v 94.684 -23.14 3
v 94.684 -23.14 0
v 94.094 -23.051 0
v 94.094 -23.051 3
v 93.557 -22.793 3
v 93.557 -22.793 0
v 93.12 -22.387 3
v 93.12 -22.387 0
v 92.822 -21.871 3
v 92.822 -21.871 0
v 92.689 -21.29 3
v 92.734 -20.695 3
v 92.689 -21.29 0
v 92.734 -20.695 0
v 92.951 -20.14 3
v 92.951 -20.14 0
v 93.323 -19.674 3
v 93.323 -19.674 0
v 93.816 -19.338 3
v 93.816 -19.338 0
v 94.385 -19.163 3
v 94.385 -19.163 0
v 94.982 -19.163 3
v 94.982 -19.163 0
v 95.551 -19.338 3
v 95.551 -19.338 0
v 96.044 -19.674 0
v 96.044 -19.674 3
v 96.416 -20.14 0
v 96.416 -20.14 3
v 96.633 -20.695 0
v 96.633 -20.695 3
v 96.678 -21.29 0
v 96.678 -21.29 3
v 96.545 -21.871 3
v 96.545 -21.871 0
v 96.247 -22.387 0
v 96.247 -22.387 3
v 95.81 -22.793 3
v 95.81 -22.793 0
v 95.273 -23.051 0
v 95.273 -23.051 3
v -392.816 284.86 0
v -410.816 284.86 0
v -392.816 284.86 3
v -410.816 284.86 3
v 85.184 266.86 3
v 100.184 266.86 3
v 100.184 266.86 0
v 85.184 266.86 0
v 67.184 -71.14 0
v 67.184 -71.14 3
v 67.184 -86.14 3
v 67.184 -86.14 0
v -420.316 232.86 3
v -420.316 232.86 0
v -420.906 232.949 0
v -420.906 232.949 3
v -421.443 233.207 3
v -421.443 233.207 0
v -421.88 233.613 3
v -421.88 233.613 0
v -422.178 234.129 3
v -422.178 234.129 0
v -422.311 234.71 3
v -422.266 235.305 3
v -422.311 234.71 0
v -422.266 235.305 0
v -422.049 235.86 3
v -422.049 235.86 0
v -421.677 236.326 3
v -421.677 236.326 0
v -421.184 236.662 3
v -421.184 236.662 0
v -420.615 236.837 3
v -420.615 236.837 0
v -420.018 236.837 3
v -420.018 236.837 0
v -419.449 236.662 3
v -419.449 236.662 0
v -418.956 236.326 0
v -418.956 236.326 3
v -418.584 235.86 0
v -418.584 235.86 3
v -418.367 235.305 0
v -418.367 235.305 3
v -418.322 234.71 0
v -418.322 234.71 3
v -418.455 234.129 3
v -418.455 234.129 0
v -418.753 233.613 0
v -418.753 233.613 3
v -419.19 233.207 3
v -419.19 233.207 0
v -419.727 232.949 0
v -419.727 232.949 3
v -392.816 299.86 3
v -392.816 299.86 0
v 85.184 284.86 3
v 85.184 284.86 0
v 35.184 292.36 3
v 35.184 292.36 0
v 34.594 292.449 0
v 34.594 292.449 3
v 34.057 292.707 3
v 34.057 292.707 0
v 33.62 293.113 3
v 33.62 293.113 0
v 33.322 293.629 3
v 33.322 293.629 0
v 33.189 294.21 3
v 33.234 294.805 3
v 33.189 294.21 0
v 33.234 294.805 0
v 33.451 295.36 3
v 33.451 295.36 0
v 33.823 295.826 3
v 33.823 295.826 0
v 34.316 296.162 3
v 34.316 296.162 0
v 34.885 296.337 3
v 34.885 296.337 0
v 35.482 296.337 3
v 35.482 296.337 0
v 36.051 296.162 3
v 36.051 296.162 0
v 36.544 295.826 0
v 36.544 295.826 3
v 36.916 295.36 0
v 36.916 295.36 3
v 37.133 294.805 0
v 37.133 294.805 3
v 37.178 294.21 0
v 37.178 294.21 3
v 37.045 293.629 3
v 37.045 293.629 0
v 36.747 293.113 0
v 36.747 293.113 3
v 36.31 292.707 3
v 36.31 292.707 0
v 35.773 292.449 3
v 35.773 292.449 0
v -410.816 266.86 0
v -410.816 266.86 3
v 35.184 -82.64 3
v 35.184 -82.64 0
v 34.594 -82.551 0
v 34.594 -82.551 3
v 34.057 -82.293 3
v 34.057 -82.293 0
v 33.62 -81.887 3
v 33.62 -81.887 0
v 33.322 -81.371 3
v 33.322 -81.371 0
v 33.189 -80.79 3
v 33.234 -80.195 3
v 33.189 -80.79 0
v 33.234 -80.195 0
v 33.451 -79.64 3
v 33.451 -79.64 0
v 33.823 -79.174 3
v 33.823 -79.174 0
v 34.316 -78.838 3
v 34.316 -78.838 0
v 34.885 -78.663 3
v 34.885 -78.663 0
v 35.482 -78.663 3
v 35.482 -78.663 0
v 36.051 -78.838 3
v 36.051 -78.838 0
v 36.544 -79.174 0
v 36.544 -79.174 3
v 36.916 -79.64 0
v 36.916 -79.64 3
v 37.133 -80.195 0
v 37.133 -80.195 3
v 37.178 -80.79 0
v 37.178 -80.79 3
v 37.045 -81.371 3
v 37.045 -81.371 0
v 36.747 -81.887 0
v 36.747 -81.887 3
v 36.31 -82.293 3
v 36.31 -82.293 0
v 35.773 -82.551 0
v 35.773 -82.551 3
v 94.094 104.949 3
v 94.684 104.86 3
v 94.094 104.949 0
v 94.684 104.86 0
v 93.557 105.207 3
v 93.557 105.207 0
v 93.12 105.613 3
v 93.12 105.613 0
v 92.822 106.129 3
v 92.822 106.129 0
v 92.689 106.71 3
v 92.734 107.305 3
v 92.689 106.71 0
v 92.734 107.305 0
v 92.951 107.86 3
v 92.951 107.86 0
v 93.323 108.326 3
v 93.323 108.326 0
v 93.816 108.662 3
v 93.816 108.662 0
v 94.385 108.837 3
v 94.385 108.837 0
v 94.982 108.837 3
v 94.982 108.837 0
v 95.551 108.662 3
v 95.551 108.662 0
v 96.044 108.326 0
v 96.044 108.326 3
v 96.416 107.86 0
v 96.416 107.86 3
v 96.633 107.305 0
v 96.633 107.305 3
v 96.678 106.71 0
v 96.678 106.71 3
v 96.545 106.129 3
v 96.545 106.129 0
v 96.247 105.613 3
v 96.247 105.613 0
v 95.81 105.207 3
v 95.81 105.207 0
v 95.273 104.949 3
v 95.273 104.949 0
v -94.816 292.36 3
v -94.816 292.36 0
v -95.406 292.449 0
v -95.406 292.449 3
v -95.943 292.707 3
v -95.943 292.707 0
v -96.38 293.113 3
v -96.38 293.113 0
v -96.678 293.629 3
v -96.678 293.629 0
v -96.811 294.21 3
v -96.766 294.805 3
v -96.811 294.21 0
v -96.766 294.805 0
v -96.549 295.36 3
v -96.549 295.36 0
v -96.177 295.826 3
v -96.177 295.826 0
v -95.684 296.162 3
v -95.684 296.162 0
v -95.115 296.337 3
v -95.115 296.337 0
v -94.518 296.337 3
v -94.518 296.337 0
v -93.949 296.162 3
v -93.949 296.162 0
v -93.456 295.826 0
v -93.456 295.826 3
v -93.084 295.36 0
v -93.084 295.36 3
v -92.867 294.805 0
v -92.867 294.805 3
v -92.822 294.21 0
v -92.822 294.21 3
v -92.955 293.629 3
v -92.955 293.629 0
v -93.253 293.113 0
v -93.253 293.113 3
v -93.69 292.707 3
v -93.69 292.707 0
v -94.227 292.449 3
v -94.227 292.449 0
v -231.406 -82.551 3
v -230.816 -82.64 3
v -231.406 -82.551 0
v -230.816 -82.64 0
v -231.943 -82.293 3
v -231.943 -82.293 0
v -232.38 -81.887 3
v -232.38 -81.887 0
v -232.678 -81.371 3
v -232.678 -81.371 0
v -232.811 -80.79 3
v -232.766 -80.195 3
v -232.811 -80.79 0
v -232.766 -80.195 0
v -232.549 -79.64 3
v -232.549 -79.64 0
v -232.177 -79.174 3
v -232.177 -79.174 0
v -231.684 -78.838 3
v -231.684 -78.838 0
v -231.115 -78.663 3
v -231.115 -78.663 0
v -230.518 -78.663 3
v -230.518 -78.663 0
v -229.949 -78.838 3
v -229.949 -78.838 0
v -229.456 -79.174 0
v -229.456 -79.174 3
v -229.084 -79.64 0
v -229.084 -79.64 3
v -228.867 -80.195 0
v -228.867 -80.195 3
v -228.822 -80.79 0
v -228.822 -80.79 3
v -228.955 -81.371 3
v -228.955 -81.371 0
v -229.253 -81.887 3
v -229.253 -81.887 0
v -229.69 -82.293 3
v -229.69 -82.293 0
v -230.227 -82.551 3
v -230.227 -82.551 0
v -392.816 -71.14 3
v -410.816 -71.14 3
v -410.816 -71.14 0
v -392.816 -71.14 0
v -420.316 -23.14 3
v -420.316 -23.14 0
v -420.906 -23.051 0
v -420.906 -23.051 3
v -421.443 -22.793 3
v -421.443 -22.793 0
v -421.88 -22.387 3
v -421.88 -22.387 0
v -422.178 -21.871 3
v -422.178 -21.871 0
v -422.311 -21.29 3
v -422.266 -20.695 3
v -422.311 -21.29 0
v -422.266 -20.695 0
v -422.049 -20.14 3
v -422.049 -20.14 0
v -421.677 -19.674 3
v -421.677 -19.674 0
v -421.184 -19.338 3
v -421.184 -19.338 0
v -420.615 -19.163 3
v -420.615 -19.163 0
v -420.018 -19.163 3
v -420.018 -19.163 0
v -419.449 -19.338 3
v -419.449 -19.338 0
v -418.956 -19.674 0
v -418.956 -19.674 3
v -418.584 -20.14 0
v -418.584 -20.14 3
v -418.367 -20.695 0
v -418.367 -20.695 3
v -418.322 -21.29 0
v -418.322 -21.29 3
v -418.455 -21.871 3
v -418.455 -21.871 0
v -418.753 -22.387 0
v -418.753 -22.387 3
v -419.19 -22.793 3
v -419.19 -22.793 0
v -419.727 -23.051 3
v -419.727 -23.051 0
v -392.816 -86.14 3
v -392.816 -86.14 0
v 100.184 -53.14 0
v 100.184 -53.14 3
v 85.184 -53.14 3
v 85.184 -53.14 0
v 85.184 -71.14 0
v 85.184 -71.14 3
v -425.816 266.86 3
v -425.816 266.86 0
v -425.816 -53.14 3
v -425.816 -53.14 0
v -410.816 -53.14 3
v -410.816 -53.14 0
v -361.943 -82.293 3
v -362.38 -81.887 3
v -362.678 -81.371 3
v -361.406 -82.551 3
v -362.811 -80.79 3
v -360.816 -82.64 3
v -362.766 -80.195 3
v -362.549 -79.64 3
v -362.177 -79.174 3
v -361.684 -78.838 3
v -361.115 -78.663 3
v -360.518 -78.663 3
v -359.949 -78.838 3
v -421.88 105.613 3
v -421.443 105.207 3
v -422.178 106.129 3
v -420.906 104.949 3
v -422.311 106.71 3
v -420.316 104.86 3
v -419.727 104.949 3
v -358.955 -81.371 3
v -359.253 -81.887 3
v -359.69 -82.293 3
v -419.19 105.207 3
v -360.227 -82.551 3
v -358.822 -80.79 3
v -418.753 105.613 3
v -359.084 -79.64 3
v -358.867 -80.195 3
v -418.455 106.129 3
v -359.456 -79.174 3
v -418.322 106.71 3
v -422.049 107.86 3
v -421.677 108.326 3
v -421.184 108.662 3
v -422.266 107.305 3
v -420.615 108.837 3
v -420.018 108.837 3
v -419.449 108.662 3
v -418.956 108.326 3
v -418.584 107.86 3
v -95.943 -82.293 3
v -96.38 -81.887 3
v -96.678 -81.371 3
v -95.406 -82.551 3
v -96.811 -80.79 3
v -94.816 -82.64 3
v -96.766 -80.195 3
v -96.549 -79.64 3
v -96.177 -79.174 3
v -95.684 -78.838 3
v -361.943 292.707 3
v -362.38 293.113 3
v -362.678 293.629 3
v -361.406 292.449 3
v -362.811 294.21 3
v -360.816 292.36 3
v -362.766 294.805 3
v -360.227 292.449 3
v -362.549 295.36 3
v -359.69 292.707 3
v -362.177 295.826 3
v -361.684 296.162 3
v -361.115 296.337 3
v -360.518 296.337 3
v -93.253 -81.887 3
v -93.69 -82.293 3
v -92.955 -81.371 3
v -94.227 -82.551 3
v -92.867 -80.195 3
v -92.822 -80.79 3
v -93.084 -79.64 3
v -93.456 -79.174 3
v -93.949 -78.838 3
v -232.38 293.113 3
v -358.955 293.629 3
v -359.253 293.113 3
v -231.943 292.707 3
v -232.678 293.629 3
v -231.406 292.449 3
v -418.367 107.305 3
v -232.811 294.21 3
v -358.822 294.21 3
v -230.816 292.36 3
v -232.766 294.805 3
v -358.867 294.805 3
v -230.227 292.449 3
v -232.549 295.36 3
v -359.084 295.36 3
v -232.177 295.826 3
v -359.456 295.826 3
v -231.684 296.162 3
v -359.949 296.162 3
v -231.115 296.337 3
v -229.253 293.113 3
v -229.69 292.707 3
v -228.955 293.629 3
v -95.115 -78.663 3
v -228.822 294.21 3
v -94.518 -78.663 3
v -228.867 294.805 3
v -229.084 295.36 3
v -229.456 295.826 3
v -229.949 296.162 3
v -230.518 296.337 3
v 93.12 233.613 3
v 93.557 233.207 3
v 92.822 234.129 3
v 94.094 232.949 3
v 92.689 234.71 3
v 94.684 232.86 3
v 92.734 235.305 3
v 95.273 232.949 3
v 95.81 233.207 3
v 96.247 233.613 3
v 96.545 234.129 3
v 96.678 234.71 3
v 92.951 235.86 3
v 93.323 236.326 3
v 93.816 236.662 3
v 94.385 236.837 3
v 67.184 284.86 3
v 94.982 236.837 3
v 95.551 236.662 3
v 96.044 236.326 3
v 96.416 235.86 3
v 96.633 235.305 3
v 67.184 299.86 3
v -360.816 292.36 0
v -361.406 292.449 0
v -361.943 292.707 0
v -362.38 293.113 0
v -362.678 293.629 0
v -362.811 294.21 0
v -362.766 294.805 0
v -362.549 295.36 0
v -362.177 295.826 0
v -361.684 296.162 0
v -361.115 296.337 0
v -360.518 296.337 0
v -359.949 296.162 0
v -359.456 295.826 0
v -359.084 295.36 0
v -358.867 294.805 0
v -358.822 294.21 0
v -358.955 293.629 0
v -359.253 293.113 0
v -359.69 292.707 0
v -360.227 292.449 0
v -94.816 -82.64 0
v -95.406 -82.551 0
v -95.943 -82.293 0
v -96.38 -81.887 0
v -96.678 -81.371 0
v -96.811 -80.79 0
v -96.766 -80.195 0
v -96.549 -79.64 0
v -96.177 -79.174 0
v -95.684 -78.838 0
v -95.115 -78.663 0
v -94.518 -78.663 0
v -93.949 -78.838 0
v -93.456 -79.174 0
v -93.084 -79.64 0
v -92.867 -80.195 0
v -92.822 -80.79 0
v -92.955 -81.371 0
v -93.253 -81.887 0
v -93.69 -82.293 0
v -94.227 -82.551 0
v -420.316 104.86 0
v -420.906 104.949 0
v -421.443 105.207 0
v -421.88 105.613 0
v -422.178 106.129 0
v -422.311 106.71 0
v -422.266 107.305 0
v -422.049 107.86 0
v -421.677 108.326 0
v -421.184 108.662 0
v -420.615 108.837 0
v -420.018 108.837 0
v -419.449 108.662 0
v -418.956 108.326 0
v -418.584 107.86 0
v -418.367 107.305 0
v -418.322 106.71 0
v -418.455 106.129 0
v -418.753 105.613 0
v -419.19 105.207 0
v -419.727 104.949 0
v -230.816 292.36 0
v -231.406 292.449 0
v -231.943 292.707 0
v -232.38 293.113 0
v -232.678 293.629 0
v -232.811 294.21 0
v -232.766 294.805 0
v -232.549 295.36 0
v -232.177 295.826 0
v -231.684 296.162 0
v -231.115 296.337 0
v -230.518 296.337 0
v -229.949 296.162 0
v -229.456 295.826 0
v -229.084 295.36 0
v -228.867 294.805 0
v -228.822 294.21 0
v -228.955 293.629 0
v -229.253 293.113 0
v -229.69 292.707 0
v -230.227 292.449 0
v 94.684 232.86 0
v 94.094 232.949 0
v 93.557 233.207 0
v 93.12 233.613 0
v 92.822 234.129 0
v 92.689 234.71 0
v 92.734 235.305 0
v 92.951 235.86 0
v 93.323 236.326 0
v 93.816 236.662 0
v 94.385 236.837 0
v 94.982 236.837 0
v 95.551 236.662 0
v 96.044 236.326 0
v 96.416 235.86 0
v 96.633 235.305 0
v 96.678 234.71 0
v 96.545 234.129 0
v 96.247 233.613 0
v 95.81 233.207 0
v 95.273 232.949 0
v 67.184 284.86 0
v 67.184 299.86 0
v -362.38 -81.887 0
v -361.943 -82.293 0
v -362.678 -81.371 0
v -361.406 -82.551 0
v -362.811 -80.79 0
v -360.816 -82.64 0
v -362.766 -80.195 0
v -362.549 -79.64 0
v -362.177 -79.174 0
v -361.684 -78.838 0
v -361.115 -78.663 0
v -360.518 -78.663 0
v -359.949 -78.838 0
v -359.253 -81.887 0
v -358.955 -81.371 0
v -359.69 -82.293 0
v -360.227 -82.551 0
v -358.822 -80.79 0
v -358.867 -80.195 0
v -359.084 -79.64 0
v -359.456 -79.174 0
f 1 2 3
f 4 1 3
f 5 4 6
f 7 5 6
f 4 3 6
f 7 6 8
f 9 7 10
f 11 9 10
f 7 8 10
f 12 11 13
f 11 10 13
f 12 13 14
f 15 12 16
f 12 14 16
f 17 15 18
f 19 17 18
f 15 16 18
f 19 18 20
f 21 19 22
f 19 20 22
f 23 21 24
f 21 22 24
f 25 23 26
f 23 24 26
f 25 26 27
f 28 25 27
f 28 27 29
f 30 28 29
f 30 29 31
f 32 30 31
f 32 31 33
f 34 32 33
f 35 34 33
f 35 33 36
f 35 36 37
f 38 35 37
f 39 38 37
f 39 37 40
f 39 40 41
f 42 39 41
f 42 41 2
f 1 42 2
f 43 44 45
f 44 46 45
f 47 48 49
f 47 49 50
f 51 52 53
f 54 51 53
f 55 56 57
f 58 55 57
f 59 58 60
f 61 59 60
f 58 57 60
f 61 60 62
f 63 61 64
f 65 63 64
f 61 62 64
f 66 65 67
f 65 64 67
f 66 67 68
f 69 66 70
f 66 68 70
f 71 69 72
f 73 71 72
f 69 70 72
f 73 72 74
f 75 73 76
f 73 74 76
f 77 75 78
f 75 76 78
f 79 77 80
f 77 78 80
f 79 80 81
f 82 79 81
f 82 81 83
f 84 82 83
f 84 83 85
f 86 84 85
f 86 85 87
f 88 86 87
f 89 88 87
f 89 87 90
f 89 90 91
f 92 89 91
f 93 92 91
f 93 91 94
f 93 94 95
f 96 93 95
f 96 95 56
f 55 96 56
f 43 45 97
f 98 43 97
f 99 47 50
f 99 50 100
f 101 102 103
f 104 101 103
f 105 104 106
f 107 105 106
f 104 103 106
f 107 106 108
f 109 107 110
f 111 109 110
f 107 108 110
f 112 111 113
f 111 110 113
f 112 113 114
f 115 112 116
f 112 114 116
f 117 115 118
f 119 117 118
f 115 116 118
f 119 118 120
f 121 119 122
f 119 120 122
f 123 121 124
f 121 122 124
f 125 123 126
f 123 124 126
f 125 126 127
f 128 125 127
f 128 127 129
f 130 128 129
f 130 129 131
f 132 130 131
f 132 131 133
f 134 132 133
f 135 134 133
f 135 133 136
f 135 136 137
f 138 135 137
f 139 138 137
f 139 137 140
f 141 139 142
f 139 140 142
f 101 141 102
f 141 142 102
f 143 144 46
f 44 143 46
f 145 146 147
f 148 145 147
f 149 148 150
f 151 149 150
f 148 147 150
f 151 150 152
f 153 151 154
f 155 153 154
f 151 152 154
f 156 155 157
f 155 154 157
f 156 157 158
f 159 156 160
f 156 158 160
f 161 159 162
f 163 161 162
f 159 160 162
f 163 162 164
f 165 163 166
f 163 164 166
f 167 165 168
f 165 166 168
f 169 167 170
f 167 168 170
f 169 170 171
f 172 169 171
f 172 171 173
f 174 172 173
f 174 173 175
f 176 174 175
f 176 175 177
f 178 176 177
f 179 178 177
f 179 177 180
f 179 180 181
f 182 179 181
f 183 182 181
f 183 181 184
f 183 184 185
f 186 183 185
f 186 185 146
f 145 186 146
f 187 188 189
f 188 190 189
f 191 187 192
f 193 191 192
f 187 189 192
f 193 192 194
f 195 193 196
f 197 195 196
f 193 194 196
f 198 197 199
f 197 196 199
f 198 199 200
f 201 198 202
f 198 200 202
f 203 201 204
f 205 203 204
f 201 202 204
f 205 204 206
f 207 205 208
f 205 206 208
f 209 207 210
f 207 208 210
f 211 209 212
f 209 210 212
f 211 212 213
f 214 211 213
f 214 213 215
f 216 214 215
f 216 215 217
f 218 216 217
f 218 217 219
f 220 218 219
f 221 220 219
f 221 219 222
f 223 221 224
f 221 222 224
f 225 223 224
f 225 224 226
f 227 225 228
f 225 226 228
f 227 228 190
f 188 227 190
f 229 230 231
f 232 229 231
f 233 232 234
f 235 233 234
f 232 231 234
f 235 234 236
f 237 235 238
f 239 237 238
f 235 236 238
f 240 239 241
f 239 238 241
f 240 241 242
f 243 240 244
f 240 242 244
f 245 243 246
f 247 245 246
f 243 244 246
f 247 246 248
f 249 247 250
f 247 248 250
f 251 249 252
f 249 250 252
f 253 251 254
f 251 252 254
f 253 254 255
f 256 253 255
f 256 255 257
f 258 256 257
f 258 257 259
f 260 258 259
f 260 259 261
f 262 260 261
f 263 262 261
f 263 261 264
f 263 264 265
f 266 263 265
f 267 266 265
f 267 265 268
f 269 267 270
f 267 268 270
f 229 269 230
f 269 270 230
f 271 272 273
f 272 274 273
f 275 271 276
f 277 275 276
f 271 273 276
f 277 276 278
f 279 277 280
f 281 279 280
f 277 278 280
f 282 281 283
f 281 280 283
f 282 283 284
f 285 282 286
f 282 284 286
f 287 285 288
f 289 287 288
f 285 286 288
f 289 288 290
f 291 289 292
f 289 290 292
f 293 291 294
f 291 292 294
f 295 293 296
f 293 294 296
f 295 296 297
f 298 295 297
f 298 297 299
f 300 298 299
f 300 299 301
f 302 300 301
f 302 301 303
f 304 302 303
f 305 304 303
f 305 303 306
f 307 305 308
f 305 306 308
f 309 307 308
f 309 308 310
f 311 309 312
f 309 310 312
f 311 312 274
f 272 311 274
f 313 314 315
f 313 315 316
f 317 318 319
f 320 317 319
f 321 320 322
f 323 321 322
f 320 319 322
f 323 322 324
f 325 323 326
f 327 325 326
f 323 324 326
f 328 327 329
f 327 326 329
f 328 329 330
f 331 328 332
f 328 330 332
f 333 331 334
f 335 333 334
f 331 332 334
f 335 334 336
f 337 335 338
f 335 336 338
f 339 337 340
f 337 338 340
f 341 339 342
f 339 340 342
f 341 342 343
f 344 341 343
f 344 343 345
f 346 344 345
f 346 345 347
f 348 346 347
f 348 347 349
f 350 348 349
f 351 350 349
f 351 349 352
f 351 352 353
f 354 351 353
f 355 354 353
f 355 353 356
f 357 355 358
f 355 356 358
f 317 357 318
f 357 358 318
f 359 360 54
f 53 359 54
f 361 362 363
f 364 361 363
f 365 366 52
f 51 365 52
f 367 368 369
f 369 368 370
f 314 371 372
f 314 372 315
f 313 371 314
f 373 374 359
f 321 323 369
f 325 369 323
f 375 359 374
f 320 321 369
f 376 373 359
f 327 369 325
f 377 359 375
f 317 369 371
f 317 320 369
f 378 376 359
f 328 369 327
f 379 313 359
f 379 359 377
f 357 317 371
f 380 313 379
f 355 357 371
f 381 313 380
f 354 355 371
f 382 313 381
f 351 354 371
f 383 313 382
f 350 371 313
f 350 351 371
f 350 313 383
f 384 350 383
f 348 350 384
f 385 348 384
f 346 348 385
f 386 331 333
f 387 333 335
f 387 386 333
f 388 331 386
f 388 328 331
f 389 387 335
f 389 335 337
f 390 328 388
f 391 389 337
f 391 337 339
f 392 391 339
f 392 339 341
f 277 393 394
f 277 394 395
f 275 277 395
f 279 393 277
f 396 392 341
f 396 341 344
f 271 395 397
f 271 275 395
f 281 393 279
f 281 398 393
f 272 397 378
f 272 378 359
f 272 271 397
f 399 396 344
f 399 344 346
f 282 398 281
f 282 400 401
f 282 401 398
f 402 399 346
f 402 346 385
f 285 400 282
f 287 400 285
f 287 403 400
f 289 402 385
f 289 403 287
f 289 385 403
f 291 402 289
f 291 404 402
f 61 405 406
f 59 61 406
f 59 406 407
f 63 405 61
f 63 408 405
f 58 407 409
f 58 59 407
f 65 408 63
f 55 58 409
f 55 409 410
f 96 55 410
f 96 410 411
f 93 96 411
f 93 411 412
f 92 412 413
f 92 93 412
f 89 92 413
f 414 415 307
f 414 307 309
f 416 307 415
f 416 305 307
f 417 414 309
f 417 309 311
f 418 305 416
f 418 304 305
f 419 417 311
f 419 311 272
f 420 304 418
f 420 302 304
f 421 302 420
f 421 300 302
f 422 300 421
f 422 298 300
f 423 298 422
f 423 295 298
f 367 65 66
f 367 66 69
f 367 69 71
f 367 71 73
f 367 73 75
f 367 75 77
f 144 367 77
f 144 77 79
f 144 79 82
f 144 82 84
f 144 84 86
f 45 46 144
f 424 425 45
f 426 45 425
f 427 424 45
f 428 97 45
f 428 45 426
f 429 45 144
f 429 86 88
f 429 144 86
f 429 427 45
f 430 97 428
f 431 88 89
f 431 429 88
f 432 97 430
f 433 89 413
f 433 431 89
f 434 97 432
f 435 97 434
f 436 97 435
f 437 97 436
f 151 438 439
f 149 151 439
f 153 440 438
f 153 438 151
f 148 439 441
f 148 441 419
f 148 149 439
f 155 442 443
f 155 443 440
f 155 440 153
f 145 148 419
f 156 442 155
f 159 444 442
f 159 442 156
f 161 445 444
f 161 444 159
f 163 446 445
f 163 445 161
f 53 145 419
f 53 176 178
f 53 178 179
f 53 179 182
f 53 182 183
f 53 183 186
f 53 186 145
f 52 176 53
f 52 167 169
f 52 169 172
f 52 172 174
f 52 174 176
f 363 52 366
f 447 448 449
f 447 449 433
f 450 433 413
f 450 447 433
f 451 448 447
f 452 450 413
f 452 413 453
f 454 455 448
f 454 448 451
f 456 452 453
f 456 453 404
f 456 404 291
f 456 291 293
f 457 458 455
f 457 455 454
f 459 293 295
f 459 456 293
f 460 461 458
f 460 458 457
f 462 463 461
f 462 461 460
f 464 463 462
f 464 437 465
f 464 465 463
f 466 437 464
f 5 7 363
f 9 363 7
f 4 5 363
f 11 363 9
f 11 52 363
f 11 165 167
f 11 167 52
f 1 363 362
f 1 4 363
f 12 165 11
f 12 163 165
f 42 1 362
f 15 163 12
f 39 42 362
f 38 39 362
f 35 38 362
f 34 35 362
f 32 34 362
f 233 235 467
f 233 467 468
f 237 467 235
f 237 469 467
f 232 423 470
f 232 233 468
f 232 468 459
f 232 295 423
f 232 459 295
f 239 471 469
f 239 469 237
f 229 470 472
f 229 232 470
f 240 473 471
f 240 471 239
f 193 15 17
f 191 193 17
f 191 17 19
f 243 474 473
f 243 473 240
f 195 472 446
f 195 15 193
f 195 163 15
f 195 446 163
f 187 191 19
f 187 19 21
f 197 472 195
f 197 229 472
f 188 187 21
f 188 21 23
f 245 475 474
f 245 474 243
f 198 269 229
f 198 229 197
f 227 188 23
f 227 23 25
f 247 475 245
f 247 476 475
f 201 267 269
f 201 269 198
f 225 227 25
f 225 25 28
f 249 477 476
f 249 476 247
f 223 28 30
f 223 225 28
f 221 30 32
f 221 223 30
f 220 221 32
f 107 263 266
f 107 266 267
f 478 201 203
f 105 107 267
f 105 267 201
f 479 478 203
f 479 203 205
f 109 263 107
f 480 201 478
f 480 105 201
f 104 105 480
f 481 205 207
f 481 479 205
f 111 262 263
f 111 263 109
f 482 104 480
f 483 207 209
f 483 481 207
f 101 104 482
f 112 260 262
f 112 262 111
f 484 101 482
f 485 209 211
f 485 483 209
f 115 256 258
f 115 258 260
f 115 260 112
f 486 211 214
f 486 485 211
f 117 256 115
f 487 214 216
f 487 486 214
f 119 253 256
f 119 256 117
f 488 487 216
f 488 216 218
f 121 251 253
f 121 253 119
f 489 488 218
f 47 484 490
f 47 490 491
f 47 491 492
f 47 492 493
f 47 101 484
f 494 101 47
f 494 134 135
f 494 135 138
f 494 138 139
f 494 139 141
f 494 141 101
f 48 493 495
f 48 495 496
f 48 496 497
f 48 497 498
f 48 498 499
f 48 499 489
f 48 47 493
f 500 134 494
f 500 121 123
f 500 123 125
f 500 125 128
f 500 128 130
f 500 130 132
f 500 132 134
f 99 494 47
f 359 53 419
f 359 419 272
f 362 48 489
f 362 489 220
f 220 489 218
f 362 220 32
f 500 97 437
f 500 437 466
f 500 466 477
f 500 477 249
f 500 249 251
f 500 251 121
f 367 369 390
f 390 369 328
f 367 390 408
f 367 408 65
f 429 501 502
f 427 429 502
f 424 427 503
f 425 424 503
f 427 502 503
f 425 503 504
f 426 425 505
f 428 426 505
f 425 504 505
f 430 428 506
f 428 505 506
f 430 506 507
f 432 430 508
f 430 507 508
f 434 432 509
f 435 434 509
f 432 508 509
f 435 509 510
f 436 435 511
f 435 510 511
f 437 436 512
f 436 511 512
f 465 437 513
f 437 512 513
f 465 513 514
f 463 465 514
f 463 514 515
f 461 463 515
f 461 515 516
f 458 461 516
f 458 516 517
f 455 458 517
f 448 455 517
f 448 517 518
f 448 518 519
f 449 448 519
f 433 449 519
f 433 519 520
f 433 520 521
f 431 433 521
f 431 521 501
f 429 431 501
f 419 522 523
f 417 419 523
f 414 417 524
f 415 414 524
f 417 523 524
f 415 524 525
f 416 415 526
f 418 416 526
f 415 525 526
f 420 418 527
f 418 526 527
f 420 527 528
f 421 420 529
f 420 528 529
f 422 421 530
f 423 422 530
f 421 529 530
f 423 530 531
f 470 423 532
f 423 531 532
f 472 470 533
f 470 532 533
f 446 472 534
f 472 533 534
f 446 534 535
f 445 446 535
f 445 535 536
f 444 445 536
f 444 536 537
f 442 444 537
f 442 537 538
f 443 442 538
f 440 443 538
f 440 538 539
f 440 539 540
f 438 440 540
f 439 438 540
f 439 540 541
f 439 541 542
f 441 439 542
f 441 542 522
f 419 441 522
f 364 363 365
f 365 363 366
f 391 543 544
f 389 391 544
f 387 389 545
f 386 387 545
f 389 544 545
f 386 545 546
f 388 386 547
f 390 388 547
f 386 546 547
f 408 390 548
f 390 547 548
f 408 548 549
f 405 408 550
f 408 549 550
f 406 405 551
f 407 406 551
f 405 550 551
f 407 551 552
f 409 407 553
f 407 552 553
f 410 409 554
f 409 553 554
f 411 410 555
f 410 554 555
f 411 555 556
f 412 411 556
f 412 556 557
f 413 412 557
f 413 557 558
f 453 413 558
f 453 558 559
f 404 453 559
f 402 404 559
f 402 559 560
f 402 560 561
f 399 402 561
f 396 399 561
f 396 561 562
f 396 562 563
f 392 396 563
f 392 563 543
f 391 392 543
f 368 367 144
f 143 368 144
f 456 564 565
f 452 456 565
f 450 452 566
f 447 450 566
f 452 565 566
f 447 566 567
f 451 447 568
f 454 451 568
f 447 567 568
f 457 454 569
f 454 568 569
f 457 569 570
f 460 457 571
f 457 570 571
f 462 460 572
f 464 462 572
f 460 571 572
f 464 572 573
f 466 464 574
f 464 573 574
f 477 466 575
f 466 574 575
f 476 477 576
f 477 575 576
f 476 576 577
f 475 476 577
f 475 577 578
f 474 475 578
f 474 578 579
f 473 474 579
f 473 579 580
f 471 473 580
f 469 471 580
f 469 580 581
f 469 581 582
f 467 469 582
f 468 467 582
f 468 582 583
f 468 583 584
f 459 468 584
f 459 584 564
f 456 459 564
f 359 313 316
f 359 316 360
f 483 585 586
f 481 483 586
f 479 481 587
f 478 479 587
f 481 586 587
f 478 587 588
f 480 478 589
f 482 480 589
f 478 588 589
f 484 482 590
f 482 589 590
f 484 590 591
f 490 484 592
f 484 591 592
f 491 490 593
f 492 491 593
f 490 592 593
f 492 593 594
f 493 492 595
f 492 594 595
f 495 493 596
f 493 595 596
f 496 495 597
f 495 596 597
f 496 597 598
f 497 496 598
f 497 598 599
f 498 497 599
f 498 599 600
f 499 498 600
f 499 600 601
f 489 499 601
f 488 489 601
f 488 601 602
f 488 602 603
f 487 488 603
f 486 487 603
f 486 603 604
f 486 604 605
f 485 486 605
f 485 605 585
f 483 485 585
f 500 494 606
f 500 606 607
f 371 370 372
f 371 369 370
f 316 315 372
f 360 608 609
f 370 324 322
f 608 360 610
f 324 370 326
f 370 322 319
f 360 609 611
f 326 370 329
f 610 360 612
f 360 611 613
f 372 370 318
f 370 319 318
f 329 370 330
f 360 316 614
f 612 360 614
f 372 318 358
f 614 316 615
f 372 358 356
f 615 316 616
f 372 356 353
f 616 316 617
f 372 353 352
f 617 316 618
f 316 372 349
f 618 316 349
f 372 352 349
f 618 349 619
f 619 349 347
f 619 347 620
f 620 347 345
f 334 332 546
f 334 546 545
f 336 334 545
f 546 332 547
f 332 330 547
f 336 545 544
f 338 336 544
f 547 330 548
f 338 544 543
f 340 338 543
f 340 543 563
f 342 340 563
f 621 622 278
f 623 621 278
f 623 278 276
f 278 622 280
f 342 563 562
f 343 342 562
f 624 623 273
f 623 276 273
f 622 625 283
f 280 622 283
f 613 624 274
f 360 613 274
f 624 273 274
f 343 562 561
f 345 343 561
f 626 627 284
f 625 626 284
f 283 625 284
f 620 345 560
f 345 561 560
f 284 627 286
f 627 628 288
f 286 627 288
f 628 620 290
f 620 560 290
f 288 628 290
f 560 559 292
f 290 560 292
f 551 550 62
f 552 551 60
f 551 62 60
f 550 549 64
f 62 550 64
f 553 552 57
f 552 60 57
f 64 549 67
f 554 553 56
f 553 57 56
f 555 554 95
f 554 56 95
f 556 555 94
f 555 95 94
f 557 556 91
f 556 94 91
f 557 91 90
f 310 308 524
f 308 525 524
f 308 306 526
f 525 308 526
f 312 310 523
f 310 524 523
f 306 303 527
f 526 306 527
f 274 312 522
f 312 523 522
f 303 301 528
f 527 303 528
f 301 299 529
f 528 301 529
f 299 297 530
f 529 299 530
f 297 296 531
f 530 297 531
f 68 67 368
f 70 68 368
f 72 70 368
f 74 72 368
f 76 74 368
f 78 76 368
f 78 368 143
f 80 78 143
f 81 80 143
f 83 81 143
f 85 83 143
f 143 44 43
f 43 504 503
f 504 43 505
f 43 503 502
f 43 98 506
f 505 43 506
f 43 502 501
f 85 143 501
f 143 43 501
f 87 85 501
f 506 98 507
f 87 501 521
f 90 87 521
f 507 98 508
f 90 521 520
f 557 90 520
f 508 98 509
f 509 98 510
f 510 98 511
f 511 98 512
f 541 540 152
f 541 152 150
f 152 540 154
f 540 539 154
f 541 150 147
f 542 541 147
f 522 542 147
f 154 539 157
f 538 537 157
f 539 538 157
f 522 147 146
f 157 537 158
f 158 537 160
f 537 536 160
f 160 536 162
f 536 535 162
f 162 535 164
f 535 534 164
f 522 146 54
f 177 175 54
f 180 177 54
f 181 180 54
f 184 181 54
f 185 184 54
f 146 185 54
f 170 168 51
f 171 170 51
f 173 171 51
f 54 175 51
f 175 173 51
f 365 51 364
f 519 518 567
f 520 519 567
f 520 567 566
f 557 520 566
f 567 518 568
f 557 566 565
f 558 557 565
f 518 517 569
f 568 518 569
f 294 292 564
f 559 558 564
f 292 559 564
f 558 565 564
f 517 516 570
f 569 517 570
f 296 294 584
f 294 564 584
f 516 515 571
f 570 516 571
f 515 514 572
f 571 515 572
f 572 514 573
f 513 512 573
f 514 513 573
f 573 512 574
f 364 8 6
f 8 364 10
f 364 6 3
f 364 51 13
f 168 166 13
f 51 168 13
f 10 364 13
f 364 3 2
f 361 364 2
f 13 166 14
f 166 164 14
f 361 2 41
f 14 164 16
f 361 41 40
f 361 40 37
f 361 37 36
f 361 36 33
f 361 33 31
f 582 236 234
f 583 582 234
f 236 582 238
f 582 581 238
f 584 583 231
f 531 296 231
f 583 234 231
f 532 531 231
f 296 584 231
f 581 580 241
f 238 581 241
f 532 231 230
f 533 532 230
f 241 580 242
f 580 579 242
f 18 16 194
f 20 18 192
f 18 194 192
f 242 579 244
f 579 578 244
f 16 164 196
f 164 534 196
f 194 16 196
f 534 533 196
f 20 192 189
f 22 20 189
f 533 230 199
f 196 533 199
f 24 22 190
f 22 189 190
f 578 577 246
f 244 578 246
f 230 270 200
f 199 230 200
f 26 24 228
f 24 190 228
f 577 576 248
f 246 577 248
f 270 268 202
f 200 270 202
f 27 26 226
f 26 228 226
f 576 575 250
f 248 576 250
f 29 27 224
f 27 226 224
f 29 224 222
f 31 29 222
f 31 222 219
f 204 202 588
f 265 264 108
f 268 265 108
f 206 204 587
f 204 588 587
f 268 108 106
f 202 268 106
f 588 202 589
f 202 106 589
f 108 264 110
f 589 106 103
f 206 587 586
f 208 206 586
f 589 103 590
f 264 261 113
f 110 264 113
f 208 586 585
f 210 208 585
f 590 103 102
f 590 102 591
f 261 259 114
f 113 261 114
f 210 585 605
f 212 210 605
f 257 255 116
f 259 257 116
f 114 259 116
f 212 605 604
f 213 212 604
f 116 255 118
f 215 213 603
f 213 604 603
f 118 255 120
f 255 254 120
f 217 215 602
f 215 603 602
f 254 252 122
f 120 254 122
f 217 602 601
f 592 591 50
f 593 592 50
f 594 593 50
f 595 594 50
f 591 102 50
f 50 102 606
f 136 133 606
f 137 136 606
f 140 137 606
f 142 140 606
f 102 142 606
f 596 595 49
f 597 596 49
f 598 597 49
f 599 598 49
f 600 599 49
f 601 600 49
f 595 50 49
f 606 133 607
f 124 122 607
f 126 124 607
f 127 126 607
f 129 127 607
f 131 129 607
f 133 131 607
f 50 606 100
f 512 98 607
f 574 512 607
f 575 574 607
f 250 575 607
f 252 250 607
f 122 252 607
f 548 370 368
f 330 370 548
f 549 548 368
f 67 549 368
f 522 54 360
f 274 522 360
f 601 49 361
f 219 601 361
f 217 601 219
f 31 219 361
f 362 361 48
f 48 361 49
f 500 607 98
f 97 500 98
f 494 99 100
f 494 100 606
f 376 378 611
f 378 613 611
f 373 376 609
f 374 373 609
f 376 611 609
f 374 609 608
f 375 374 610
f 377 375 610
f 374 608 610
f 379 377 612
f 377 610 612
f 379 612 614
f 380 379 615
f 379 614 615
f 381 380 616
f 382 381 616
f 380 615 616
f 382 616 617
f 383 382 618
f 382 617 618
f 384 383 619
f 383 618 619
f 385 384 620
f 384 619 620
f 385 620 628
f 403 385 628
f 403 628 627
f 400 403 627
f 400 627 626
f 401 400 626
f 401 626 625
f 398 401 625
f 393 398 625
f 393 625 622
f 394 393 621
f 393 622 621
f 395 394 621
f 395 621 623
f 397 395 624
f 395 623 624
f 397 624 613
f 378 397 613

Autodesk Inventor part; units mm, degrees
ref_plane "YZ Plane" through (0, 0, 0) normal (1, 0, 0) x (0, 1, 0)
ref_plane "XZ Plane" through (0, 0, 0) normal (0, 1, 0) x (-1, 0, 0)
ref_plane "XY Plane" through (0, 0, 0) normal (0, 0, 1) x (1, 0, 0)
sketch "Sketch1" plane through (0, 0, 0) normal (0, 0, 1) x (1, 0, 0)
  line L0 (-412.8165, 301.8597) -> (87.1835, 301.8597) projected
  line L1 (-427.8165, 301.8597) -> (-412.8165, 301.8597) projected
  line L2 (-427.8165, 286.8597) -> (-427.8165, 301.8597) projected
  line L3 (-427.8165, -73.1403) -> (-427.8165, 286.8597) projected
  line L4 (-412.8165, 286.8597) -> (-427.8165, 286.8597) projected
  line L5 (-412.8165, 286.8597) -> (-427.8165, 286.8597) projected
  line L6 (-412.8165, 301.8597) -> (-412.8165, 286.8597) projected
  line L7 (-427.8165, 301.8597) -> (-412.8165, 301.8597) projected
  line L8 (-427.8165, 286.8597) -> (-427.8165, 301.8597) projected
  line L9 (-412.8165, -88.1403) -> (-412.8165, -73.1403) projected
  line L10 (-412.8165, -73.1403) -> (-427.8165, -73.1403) projected
  line L11 (-427.8165, -88.1403) -> (-427.8165, -73.1403) projected
  line L12 (-412.8165, -88.1403) -> (-427.8165, -88.1403) projected
  line L13 (-412.8165, -73.1403) -> (-412.8165, 286.8597) projected
  line L14 (87.1835, -73.1403) -> (-412.8165, -73.1403) projected
  line L15 (87.1835, -88.1403) -> (-412.8165, -88.1403) projected
  line L16 (102.1835, -88.1403) -> (102.1835, -73.1403) projected
  line L17 (102.1835, -73.1403) -> (87.1835, -73.1403) projected
  line L18 (87.1835, -88.1403) -> (87.1835, -73.1403) projected
  line L19 (102.1835, -88.1403) -> (87.1835, -88.1403) projected
  line L20 (87.1835, -73.1403) -> (87.1835, 286.8597) projected
  line L21 (102.1835, -73.1403) -> (102.1835, 286.8597) projected
  line L22 (87.1835, 286.8597) -> (102.1835, 286.8597) projected
  line L23 (102.1835, 286.8597) -> (102.1835, 301.8597) projected
  line L24 (87.1835, 301.8597) -> (102.1835, 301.8597) projected
  line L25 (87.1835, 286.8597) -> (87.1835, 301.8597) projected
  line L26 (87.1835, 286.8597) -> (-412.8165, 286.8597) projected
  line L27 (-312.8165, -73.1403) -> (-312.8165, 286.8597) projected
  line L28 (-297.8165, -73.1403) -> (-297.8165, 286.8597) projected
  line L29 (-12.8165, -73.1403) -> (-12.8165, 286.8597) projected
  line L30 (-27.8165, -73.1403) -> (-27.8165, 286.8597) projected
  line L31 (-425.8165, -71.1403) -> (-410.8165, -71.1403)
  line L32 (-410.8165, -71.1403) -> (-410.8165, -86.1403)
  line L33 (-410.8165, -86.1403) -> (85.1835, -86.1403)
  line L34 (85.1835, -86.1403) -> (85.1835, -71.1403)
  line L35 (85.1835, -71.1403) -> (100.1835, -71.1403)
  line L36 (100.1835, -71.1403) -> (100.1835, 284.8597)
  line L37 (100.1835, 284.8597) -> (85.1835, 284.8597)
  line L38 (85.1835, 284.8597) -> (85.1835, 299.8597)
  line L39 (85.1835, 299.8597) -> (-410.8165, 299.8597)
  line L40 (-410.8165, 299.8597) -> (-410.8165, 284.8597)
  line L41 (-410.8165, 284.8597) -> (-425.8165, 284.8597)
  line L42 (-425.8165, 284.8597) -> (-425.8165, -71.1403)
  point P0 (0, 0)
  dimension "d2" = 2
  dimension "d3" = 2
  dimension "d4" = 2
  dimension "d5" = 2
  dimension "d6" = 2
  dimension "d7" = 2
  dimension "d8" = 2
  dimension "d9" = 2
  dimension "d10" = 2
  dimension "d11" = 2
  dimension "d12" = 2
  dimension "d13" = 2
extrude "Extrusion1" add sketch "Sketch1" along normal blind 3 contours L41 L40 L26 L27 L14 L32 L31 L13 | L13 L31 L42 L41 | L40 L39 L38 L26 | L37 L36 L35 L20 | L20 L35 L34 L14 L29 L26 L38 L37 | L26 L28 L14 L27 | L29 L14 L30 L26 | L26 L30 L14 L28 | L14 L34 L33 L32
sketch "Sketch3" plane through (0, 0, 3) normal (0, 0, 1) x (1, 0, 0)
  line L0 (100.1835, -71.1403) -> (100.1835, 284.8597) projected
  line L1 (-425.8165, 284.8597) -> (-425.8165, -71.1403) projected
  line L2 (-425.8165, -71.1403) -> (-410.8165, -71.1403) projected
  line L3 (-410.8165, 284.8597) -> (-425.8165, 284.8597) projected
  line L4 (85.1835, -86.1403) -> (85.1835, -71.1403) projected
  line L5 (-410.8165, 299.8597) -> (-410.8165, 284.8597) projected
  line L6 (-410.8165, -86.1403) -> (85.1835, -86.1403) projected
  line L7 (85.1835, 299.8597) -> (-410.8165, 299.8597) projected
  point P0 (0, 0)
  point P1 (94.6835, -21.1403)
  point P2 (94.6835, 106.8597)
  point P3 (94.6835, 234.8597)
  point P4 (-420.3165, 234.8597)
  point P5 (-420.3165, 106.8597)
  point P6 (-420.3165, -21.1403)
  point P7 (35.1835, -80.6403)
  point P8 (-94.8165, -80.6403)
  point P9 (-230.8165, -80.6403)
  point P10 (-360.8165, -80.6403)
  point P11 (-360.8165, 294.3597)
  point P12 (-230.8165, 294.3597)
  point P13 (-94.8165, 294.3597)
  point P14 (35.1835, 294.3597)
  dimension "d18" = 5.5
  dimension "d19" = 5.5
  dimension "d20" = 50
  dimension "d21" = 50
  dimension "d22" = 356
  dimension "d23" = 178
  dimension "d24" = 50
  dimension "d25" = 50
  dimension "d26" = 5.5
  dimension "d27" = 5.5
  dimension "d28" = 180
  dimension "d29" = 180
hole "FrameMountHoles" at (94.6835, -21.1403, 3) at (94.6835, 106.8597, 3) at (94.6835, 234.8597, 3) at (-420.3165, 234.8597, 3) at (-420.3165, 106.8597, 3) at (-420.3165, -21.1403, 3) at (35.1835, -80.6403, 3) at (-94.8165, -80.6403, 3) at (-230.8165, -80.6403, 3) at (-360.8165, -80.6403, 3) at (-360.8165, 294.3597, 3) at (-230.8165, 294.3597, 3) at (-94.8165, 294.3597, 3) at (35.1835, 294.3597, 3) direction (0, 0, -1) diameter 4 depth 8 tip angle 118
sketch "Sketch10" plane through (0, 0, 3) normal (0, 0, 1) x (1, 0, 0)
  circle A0 centre (-94.8165, 294.3597) radius 2 projected
  circle A1 centre (-360.8165, 294.3597) radius 2 projected
  circle A2 centre (-230.8165, -80.6403) radius 2 projected
  circle A3 centre (35.1835, -80.6403) radius 2 projected
  circle A4 centre (-420.3165, 106.8597) radius 2 projected
  circle A5 centre (94.6835, 234.8597) radius 2 projected
  circle A6 centre (94.6835, -21.1403) radius 2 projected
  circle A7 centre (94.6835, 106.8597) radius 2 projected
  circle A8 centre (-420.3165, 234.8597) radius 2 projected
  circle A9 centre (-420.3165, -21.1403) radius 2 projected
  circle A10 centre (-94.8165, -80.6403) radius 2 projected
  circle A11 centre (-360.8165, -80.6403) radius 2 projected
  circle A12 centre (-230.8165, 294.3597) radius 2 projected
  circle A13 centre (35.1835, 294.3597) radius 2 projected
  line L0 (-425.8165, -71.1403) -> (-410.8165, -71.1403) projected
  line L1 (-410.8165, -71.1403) -> (-410.8165, -86.1403) projected
  line L2 (-410.8165, -86.1403) -> (85.1835, -86.1403) projected
  line L3 (85.1835, -86.1403) -> (85.1835, -71.1403) projected
  line L4 (85.1835, -71.1403) -> (100.1835, -71.1403) projected
  line L5 (100.1835, -71.1403) -> (100.1835, 284.8597) projected
  line L6 (100.1835, 284.8597) -> (85.1835, 284.8597) projected
  line L7 (85.1835, 284.8597) -> (85.1835, 299.8597) projected
  line L8 (85.1835, 299.8597) -> (-410.8165, 299.8597) projected
  line L9 (-410.8165, 299.8597) -> (-410.8165, 284.8597) projected
  line L10 (-410.8165, 284.8597) -> (-425.8165, 284.8597) projected
  line L11 (-425.8165, 284.8597) -> (-425.8165, -71.1403) projected
  line L12 (100.1835, -71.1403) -> (100.1835, 284.8597) projected
  line L13 (85.1835, 284.8597) -> (100.1835, 284.8597)
  line L14 (100.1835, 284.8597) -> (100.1835, 266.8597)
  line L15 (100.1835, 266.8597) -> (85.1835, 266.8597)
  line L16 (85.1835, 266.8597) -> (85.1835, 284.8597)
  line L17 (85.1835, 284.8597) -> (67.1835, 284.8597)
  line L18 (67.1835, 284.8597) -> (67.1835, 299.8597)
  line L19 (67.1835, 299.8597) -> (85.1835, 299.8597)
  line L20 (85.1835, 299.8597) -> (85.1835, 284.8597)
  line L21 (-410.8165, 284.8597) -> (-392.8165, 284.8597)
  line L22 (-392.8165, 284.8597) -> (-392.8165, 299.8597)
  line L23 (-392.8165, 299.8597) -> (-410.8165, 299.8597)
  line L24 (-410.8165, 299.8597) -> (-410.8165, 284.8597)
  line L25 (-410.8165, 284.8597) -> (-425.8165, 284.8597)
  line L26 (-425.8165, 284.8597) -> (-425.8165, 266.8597)
  line L27 (-425.8165, 266.8597) -> (-410.8165, 266.8597)
  line L28 (-410.8165, 266.8597) -> (-410.8165, 284.8597)
  line L29 (-410.8165, -71.1403) -> (-425.8165, -71.1403)
  line L30 (-425.8165, -71.1403) -> (-425.8165, -53.1403)
  line L31 (-425.8165, -53.1403) -> (-410.8165, -53.1403)
  line L32 (-410.8165, -53.1403) -> (-410.8165, -71.1403)
  line L33 (-410.8165, -71.1403) -> (-392.8165, -71.1403)
  line L34 (-392.8165, -71.1403) -> (-392.8165, -86.1403)
  line L35 (-392.8165, -86.1403) -> (-410.8165, -86.1403)
  line L36 (-410.8165, -86.1403) -> (-410.8165, -71.1403)
  line L37 (-410.8165, -86.1403) -> (85.1835, -86.1403) projected
  line L38 (85.1835, -71.1403) -> (67.1835, -71.1403)
  line L39 (67.1835, -71.1403) -> (67.1835, -86.1403)
  line L40 (67.1835, -86.1403) -> (85.1835, -86.1403)
  line L41 (85.1835, -86.1403) -> (85.1835, -71.1403)
  line L42 (85.1835, -71.1403) -> (100.1835, -71.1403)
  line L43 (100.1835, -71.1403) -> (100.1835, -53.1403)
  line L44 (100.1835, -53.1403) -> (85.1835, -53.1403)
  line L45 (85.1835, -53.1403) -> (85.1835, -71.1403)
  point P0 (0, 0)
  dimension "d78" = 18
extrude "TriCuts" cut sketch "Sketch10" against normal through all contours L11 L31 L32 L0 | L33 L34 L2 L1 | L11 L10 L28 L27 | L39 L38 L3 L2 | L9 L8 L22 L21 | L45 L44 L5 L4 | L8 L7 L17 L18 | L15 L16 L6 L5
equation "\"d4\" = d2"
equation "\"d5\" = d3"
equation "\"d6\" = d2"
equation "\"d7\" = d2"
equation "\"d8\" = d3"
equation "\"d9\" = d2"
equation "\"d10\" = d2"
equation "\"d11\" = d3"
equation "\"d12\" = d2"
equation "\"d13\" = d2"
equation "\"d19\" = d18"
equation "\"d23\" = 0.5 * d22"
equation "\"d26\" = d18"
equation "\"d27\" = d18"
equation "\"d29\" = d28"
properties part number "BasePlate" material "Aluminum 6061"
